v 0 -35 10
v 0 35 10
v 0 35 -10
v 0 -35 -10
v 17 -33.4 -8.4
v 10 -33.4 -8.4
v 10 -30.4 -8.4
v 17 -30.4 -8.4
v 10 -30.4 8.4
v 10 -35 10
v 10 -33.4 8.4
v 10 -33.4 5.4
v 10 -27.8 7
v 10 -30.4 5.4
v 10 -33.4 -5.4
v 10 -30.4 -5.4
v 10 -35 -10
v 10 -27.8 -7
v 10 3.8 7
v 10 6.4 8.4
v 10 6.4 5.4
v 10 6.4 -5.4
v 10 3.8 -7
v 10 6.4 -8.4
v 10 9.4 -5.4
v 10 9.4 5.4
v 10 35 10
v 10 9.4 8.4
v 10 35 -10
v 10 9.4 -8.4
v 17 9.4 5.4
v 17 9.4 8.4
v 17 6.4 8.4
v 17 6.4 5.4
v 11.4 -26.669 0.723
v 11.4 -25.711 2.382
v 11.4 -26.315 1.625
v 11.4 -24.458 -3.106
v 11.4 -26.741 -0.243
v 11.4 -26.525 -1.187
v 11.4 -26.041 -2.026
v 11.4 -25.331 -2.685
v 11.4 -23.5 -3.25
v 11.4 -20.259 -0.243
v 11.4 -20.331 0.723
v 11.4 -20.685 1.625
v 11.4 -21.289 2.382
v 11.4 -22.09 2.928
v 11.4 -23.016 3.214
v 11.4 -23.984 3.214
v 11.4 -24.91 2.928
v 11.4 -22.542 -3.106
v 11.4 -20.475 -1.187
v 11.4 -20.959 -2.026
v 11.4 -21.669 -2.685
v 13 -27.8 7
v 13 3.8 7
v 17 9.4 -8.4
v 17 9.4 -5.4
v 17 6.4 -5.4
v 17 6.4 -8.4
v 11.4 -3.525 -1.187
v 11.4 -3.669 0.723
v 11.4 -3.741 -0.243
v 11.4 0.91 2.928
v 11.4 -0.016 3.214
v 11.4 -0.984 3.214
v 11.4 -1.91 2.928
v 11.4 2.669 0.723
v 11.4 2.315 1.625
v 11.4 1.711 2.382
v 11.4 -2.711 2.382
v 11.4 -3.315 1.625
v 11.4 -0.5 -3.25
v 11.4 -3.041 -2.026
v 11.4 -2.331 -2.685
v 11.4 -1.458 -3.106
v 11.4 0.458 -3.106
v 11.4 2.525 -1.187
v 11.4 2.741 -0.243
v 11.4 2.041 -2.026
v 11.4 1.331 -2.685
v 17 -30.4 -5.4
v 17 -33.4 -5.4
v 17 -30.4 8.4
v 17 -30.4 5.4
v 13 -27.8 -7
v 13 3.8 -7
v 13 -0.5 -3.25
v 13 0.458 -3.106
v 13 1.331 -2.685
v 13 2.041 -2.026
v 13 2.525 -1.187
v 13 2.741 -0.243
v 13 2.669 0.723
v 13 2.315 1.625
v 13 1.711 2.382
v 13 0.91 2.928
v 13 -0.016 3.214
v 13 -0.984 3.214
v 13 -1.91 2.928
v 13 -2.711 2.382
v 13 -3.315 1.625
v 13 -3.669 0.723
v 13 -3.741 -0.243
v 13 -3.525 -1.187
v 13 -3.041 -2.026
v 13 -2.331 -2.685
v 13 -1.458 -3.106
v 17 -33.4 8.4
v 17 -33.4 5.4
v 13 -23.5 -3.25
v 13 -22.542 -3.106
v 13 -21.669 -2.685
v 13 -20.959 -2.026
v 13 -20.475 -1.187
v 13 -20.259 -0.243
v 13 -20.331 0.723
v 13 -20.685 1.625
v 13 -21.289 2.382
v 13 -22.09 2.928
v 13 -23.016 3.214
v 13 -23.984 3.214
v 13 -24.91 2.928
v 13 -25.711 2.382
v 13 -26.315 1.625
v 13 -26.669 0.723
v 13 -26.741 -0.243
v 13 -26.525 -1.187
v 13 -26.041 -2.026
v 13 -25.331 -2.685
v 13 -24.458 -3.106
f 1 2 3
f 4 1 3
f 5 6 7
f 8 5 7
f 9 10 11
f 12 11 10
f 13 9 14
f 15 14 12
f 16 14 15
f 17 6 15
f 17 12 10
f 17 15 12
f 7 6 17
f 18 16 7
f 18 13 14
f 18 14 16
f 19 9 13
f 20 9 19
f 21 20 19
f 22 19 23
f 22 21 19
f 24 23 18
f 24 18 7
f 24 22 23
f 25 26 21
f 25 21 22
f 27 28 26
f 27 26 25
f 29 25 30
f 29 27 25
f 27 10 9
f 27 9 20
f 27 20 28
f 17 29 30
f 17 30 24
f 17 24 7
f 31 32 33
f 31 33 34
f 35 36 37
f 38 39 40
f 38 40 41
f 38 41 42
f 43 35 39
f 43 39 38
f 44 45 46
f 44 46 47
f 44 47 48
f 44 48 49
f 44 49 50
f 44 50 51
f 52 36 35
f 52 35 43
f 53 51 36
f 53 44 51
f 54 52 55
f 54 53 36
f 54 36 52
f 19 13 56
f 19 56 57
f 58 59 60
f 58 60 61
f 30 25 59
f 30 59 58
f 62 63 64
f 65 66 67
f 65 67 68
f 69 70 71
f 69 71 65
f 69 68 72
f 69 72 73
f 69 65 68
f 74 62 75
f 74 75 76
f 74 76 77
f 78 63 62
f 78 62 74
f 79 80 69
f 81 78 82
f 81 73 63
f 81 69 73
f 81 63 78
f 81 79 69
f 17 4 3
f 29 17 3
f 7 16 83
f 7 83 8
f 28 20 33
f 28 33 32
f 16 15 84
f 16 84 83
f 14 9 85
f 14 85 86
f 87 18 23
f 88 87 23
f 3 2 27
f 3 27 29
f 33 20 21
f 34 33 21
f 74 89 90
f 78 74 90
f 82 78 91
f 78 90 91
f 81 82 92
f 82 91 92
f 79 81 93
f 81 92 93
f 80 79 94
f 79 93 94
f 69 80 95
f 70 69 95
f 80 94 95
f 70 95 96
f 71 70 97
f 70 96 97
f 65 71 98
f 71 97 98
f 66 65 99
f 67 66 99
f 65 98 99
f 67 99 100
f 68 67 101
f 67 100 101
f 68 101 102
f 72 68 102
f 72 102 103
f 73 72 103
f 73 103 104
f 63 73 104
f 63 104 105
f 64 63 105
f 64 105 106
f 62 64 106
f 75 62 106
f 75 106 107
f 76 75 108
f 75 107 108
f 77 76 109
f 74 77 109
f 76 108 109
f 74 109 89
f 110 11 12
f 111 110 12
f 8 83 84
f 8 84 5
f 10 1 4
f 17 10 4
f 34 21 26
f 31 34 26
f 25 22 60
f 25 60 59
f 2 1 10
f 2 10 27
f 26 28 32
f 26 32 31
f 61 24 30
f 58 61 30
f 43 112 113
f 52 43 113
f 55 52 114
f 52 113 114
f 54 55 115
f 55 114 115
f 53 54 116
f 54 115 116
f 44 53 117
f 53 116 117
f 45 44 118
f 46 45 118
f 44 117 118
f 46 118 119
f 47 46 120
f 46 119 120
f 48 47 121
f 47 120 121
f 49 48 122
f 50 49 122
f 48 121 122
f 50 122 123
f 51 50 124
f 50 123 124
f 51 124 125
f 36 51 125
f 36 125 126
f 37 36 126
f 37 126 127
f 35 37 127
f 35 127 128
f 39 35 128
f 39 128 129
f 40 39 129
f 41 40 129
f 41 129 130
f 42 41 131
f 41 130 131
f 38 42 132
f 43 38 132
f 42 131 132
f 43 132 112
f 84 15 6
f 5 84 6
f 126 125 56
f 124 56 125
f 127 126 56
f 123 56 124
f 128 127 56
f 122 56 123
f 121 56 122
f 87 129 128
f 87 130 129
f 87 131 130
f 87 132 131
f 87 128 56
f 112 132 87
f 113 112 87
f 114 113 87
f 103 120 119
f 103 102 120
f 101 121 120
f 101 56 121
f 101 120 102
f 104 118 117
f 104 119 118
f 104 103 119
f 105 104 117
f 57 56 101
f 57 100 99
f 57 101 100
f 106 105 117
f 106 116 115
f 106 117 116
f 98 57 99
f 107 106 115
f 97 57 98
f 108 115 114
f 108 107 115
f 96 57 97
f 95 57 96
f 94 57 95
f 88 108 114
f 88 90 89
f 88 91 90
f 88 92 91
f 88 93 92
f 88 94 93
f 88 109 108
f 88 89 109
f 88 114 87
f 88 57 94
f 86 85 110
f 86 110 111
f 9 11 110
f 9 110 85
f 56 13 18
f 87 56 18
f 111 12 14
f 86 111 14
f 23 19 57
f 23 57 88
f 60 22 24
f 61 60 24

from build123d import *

# Parameters (mm, degrees)
SKETCH1_W           = 20
SKETCH1_H           = 70
BOSS_EXTRUDE1_DEPTH = 10
SKETCH2_W           = 3
SKETCH2_H           = 3
BOSS_EXTRUDE2_DEPTH = 7
SKETCH3_W           = 14
SKETCH3_H           = 31.6
BOSS_EXTRUDE3_DEPTH = 3
SKETCH4_R           = 3.25
CUT_EXTRUDE1_DEPTH  = 1.6


with BuildPart() as part:
    # Sketch1 → Boss-Extrude1 (new body)
    with BuildSketch(Plane(origin=(0, 0, 0), x_dir=(0, 0, -1), z_dir=(1, 0, 0))):
        Rectangle(SKETCH1_W, SKETCH1_H)
    extrude(amount=BOSS_EXTRUDE1_DEPTH)

    # Sketch2 → Boss-Extrude2 (add)
    with BuildSketch(Plane(origin=(10, 0, 0), x_dir=(0, 0, -1), z_dir=(1, 0, 0))):
        with Locations((-6.9, 7.9)):
            Rectangle(SKETCH2_W, SKETCH2_H)
        with Locations((6.9, 7.9)):
            Rectangle(SKETCH2_W, SKETCH2_H)
        with Locations((6.9, -31.9)):
            Rectangle(SKETCH2_W, SKETCH2_H)
        with Locations((-6.9, -31.9)):
            Rectangle(SKETCH2_W, SKETCH2_H)
    extrude(amount=BOSS_EXTRUDE2_DEPTH)

    # Sketch3 → Boss-Extrude3 (add)
    with BuildSketch(Plane(origin=(10, 0, 0), x_dir=(0, 0, -1), z_dir=(1, 0, 0))):
        with Locations((0, -12)):
            Rectangle(SKETCH3_W, SKETCH3_H)
    extrude(amount=BOSS_EXTRUDE3_DEPTH)

    # Sketch4 → Cut-Extrude1 (cut)
    with BuildSketch(Plane(origin=(13, 0, 0), x_dir=(0, 0, -1), z_dir=(1, 0, 0))):
        with Locations((0, -23.5)):
            Circle(SKETCH4_R)
        with Locations((0, -0.5)):
            Circle(SKETCH4_R)
    extrude(amount=-CUT_EXTRUDE1_DEPTH, mode=Mode.SUBTRACT)


solid = part.part
